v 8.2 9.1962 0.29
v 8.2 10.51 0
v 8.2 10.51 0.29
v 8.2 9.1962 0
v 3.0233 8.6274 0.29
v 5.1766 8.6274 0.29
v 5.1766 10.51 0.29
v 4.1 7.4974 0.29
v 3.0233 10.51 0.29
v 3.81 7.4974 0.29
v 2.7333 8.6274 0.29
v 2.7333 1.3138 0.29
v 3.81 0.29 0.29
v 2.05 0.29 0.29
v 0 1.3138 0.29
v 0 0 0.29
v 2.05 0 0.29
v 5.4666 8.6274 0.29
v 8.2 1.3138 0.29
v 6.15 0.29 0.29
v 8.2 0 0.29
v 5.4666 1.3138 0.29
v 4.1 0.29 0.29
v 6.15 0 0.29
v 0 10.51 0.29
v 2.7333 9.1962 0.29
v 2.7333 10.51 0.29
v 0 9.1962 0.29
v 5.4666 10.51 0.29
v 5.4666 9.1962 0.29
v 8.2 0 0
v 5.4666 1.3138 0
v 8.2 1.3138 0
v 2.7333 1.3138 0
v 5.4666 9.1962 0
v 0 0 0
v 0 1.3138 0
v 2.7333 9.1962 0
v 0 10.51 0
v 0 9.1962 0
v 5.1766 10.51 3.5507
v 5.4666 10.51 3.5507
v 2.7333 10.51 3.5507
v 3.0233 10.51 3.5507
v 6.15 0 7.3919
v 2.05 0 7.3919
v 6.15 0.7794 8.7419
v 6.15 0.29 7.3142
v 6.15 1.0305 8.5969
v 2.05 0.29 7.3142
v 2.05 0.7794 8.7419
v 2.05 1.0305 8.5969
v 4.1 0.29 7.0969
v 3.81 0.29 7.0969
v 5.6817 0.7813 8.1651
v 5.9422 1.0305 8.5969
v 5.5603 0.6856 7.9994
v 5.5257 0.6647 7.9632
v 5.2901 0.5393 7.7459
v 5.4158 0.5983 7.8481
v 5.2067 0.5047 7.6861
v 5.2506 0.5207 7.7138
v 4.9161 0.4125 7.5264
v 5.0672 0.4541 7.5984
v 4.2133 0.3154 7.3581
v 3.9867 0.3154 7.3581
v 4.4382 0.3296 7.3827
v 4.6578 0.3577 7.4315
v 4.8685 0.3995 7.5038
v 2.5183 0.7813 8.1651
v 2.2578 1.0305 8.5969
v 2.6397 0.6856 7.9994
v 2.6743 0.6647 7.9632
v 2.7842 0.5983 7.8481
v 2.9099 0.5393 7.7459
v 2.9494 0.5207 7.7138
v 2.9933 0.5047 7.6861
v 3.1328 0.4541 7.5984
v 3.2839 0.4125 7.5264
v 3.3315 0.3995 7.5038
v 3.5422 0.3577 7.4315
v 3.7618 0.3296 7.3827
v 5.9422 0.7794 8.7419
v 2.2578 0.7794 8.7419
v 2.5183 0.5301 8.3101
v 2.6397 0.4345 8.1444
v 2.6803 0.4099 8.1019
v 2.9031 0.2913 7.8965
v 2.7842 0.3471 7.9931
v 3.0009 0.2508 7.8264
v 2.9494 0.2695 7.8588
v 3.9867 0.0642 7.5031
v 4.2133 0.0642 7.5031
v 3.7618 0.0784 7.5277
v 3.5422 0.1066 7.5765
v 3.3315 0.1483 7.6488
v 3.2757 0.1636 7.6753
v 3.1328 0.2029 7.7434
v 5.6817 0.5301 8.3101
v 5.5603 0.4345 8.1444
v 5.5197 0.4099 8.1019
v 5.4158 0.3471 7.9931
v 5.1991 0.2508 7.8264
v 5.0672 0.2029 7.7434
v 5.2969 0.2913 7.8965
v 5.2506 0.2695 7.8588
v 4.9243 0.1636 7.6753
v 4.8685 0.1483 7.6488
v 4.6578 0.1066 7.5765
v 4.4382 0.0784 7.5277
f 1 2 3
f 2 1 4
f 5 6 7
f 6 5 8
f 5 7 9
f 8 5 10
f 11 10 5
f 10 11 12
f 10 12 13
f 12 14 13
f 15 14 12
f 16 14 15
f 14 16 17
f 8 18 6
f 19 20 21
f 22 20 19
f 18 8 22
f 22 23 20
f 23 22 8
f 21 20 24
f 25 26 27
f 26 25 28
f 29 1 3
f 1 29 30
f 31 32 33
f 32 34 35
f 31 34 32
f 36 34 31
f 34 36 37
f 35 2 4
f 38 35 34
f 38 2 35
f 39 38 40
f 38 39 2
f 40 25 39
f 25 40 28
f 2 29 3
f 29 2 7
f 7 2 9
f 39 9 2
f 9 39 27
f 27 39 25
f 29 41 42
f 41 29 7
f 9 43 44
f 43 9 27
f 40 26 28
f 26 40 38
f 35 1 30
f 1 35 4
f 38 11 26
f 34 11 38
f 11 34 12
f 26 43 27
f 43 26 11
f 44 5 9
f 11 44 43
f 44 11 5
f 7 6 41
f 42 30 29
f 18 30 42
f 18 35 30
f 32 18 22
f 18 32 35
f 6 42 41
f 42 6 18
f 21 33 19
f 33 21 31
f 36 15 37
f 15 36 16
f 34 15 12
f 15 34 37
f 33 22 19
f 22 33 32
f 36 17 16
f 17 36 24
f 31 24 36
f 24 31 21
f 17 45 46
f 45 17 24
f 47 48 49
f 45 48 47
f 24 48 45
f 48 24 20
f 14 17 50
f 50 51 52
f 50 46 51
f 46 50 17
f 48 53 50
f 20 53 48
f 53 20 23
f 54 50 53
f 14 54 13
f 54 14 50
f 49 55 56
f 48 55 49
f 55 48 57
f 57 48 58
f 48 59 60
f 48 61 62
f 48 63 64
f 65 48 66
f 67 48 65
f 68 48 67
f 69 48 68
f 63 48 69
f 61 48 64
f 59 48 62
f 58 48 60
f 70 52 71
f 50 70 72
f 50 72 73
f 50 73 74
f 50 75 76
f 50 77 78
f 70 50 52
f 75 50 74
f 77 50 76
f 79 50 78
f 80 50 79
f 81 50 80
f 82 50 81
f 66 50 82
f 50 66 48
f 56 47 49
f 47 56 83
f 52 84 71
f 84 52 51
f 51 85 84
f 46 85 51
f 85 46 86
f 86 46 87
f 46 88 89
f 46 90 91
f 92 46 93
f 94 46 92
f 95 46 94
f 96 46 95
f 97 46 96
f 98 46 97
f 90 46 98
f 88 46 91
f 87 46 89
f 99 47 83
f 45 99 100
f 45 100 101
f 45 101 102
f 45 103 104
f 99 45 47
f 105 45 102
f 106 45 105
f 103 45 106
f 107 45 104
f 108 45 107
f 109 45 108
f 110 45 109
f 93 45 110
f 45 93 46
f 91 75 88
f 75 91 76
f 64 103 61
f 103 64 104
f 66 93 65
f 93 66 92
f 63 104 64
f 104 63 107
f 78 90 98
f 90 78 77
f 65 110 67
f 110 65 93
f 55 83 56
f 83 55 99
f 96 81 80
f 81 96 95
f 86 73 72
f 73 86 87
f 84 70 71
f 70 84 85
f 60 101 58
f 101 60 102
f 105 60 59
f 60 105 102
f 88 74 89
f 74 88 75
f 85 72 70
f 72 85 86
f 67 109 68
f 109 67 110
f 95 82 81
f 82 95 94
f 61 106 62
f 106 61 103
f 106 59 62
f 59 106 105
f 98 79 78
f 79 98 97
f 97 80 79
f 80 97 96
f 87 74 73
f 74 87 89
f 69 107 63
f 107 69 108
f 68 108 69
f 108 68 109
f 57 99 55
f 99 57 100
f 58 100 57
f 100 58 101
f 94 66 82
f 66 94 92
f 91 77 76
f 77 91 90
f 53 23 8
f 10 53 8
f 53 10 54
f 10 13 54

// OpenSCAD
$fn = 50;

union() {
    translate([2.7333, 0, 0]) {
        cube([2.7333, 10.51, 0.29]);
    };
    union() {
        translate([0, 9.1962, 0]) {
            cube([8.2, 1.3138, 0.29]);
        };
        translate([2.7333, 10.51, 0]) {
            rotate([180, 270, 0]) {
                linear_extrude(height=0.29) {
                    polygon([[0, 0], [3.5507041555162, 0], [0, 2.05]]);
                };
            };
        };
        translate([5.1766, 10.51, 0]) {
            rotate([180, 270, 0]) {
                linear_extrude(height=0.29) {
                    polygon([[0, 0], [3.5507041555162, 0], [0, 2.05]]);
                };
            };
        };
    };
    difference() {
        union() {
            cube([8.2, 1.3138, 0.29]);
            translate([2.05, 0, 0]) {
                cube([4.1, 0.29, 7.3919]);
            };
            translate([2.05, 0, 7.3919]) {
                rotate([-30, 0, 0]) {
                    cube([4.1, 0.29, 1.5588]);
                };
            };
        };
        hull() {
            translate([4.1, 2.6666700957508, 8.0807]) {
                rotate([60, 0, 0]) {
                    cylinder(h=7, r2=1.805, r1=1.805);
                };
            };
            translate([4.1, 2.6666700957508, 9.8807]) {
                rotate([60, 0, 0]) {
                    cylinder(h=7, r2=2.527, r1=2.527);
                };
            };
        };
    };
    translate([4.1, 0.29, 0.29]) {
        rotate([0, 270, 0]) {
            linear_extrude(height=0.29) {
                polygon([[0, 0], [6.8069, 0], [0, 7.2073892429862]]);
            };
        };
    };
};
